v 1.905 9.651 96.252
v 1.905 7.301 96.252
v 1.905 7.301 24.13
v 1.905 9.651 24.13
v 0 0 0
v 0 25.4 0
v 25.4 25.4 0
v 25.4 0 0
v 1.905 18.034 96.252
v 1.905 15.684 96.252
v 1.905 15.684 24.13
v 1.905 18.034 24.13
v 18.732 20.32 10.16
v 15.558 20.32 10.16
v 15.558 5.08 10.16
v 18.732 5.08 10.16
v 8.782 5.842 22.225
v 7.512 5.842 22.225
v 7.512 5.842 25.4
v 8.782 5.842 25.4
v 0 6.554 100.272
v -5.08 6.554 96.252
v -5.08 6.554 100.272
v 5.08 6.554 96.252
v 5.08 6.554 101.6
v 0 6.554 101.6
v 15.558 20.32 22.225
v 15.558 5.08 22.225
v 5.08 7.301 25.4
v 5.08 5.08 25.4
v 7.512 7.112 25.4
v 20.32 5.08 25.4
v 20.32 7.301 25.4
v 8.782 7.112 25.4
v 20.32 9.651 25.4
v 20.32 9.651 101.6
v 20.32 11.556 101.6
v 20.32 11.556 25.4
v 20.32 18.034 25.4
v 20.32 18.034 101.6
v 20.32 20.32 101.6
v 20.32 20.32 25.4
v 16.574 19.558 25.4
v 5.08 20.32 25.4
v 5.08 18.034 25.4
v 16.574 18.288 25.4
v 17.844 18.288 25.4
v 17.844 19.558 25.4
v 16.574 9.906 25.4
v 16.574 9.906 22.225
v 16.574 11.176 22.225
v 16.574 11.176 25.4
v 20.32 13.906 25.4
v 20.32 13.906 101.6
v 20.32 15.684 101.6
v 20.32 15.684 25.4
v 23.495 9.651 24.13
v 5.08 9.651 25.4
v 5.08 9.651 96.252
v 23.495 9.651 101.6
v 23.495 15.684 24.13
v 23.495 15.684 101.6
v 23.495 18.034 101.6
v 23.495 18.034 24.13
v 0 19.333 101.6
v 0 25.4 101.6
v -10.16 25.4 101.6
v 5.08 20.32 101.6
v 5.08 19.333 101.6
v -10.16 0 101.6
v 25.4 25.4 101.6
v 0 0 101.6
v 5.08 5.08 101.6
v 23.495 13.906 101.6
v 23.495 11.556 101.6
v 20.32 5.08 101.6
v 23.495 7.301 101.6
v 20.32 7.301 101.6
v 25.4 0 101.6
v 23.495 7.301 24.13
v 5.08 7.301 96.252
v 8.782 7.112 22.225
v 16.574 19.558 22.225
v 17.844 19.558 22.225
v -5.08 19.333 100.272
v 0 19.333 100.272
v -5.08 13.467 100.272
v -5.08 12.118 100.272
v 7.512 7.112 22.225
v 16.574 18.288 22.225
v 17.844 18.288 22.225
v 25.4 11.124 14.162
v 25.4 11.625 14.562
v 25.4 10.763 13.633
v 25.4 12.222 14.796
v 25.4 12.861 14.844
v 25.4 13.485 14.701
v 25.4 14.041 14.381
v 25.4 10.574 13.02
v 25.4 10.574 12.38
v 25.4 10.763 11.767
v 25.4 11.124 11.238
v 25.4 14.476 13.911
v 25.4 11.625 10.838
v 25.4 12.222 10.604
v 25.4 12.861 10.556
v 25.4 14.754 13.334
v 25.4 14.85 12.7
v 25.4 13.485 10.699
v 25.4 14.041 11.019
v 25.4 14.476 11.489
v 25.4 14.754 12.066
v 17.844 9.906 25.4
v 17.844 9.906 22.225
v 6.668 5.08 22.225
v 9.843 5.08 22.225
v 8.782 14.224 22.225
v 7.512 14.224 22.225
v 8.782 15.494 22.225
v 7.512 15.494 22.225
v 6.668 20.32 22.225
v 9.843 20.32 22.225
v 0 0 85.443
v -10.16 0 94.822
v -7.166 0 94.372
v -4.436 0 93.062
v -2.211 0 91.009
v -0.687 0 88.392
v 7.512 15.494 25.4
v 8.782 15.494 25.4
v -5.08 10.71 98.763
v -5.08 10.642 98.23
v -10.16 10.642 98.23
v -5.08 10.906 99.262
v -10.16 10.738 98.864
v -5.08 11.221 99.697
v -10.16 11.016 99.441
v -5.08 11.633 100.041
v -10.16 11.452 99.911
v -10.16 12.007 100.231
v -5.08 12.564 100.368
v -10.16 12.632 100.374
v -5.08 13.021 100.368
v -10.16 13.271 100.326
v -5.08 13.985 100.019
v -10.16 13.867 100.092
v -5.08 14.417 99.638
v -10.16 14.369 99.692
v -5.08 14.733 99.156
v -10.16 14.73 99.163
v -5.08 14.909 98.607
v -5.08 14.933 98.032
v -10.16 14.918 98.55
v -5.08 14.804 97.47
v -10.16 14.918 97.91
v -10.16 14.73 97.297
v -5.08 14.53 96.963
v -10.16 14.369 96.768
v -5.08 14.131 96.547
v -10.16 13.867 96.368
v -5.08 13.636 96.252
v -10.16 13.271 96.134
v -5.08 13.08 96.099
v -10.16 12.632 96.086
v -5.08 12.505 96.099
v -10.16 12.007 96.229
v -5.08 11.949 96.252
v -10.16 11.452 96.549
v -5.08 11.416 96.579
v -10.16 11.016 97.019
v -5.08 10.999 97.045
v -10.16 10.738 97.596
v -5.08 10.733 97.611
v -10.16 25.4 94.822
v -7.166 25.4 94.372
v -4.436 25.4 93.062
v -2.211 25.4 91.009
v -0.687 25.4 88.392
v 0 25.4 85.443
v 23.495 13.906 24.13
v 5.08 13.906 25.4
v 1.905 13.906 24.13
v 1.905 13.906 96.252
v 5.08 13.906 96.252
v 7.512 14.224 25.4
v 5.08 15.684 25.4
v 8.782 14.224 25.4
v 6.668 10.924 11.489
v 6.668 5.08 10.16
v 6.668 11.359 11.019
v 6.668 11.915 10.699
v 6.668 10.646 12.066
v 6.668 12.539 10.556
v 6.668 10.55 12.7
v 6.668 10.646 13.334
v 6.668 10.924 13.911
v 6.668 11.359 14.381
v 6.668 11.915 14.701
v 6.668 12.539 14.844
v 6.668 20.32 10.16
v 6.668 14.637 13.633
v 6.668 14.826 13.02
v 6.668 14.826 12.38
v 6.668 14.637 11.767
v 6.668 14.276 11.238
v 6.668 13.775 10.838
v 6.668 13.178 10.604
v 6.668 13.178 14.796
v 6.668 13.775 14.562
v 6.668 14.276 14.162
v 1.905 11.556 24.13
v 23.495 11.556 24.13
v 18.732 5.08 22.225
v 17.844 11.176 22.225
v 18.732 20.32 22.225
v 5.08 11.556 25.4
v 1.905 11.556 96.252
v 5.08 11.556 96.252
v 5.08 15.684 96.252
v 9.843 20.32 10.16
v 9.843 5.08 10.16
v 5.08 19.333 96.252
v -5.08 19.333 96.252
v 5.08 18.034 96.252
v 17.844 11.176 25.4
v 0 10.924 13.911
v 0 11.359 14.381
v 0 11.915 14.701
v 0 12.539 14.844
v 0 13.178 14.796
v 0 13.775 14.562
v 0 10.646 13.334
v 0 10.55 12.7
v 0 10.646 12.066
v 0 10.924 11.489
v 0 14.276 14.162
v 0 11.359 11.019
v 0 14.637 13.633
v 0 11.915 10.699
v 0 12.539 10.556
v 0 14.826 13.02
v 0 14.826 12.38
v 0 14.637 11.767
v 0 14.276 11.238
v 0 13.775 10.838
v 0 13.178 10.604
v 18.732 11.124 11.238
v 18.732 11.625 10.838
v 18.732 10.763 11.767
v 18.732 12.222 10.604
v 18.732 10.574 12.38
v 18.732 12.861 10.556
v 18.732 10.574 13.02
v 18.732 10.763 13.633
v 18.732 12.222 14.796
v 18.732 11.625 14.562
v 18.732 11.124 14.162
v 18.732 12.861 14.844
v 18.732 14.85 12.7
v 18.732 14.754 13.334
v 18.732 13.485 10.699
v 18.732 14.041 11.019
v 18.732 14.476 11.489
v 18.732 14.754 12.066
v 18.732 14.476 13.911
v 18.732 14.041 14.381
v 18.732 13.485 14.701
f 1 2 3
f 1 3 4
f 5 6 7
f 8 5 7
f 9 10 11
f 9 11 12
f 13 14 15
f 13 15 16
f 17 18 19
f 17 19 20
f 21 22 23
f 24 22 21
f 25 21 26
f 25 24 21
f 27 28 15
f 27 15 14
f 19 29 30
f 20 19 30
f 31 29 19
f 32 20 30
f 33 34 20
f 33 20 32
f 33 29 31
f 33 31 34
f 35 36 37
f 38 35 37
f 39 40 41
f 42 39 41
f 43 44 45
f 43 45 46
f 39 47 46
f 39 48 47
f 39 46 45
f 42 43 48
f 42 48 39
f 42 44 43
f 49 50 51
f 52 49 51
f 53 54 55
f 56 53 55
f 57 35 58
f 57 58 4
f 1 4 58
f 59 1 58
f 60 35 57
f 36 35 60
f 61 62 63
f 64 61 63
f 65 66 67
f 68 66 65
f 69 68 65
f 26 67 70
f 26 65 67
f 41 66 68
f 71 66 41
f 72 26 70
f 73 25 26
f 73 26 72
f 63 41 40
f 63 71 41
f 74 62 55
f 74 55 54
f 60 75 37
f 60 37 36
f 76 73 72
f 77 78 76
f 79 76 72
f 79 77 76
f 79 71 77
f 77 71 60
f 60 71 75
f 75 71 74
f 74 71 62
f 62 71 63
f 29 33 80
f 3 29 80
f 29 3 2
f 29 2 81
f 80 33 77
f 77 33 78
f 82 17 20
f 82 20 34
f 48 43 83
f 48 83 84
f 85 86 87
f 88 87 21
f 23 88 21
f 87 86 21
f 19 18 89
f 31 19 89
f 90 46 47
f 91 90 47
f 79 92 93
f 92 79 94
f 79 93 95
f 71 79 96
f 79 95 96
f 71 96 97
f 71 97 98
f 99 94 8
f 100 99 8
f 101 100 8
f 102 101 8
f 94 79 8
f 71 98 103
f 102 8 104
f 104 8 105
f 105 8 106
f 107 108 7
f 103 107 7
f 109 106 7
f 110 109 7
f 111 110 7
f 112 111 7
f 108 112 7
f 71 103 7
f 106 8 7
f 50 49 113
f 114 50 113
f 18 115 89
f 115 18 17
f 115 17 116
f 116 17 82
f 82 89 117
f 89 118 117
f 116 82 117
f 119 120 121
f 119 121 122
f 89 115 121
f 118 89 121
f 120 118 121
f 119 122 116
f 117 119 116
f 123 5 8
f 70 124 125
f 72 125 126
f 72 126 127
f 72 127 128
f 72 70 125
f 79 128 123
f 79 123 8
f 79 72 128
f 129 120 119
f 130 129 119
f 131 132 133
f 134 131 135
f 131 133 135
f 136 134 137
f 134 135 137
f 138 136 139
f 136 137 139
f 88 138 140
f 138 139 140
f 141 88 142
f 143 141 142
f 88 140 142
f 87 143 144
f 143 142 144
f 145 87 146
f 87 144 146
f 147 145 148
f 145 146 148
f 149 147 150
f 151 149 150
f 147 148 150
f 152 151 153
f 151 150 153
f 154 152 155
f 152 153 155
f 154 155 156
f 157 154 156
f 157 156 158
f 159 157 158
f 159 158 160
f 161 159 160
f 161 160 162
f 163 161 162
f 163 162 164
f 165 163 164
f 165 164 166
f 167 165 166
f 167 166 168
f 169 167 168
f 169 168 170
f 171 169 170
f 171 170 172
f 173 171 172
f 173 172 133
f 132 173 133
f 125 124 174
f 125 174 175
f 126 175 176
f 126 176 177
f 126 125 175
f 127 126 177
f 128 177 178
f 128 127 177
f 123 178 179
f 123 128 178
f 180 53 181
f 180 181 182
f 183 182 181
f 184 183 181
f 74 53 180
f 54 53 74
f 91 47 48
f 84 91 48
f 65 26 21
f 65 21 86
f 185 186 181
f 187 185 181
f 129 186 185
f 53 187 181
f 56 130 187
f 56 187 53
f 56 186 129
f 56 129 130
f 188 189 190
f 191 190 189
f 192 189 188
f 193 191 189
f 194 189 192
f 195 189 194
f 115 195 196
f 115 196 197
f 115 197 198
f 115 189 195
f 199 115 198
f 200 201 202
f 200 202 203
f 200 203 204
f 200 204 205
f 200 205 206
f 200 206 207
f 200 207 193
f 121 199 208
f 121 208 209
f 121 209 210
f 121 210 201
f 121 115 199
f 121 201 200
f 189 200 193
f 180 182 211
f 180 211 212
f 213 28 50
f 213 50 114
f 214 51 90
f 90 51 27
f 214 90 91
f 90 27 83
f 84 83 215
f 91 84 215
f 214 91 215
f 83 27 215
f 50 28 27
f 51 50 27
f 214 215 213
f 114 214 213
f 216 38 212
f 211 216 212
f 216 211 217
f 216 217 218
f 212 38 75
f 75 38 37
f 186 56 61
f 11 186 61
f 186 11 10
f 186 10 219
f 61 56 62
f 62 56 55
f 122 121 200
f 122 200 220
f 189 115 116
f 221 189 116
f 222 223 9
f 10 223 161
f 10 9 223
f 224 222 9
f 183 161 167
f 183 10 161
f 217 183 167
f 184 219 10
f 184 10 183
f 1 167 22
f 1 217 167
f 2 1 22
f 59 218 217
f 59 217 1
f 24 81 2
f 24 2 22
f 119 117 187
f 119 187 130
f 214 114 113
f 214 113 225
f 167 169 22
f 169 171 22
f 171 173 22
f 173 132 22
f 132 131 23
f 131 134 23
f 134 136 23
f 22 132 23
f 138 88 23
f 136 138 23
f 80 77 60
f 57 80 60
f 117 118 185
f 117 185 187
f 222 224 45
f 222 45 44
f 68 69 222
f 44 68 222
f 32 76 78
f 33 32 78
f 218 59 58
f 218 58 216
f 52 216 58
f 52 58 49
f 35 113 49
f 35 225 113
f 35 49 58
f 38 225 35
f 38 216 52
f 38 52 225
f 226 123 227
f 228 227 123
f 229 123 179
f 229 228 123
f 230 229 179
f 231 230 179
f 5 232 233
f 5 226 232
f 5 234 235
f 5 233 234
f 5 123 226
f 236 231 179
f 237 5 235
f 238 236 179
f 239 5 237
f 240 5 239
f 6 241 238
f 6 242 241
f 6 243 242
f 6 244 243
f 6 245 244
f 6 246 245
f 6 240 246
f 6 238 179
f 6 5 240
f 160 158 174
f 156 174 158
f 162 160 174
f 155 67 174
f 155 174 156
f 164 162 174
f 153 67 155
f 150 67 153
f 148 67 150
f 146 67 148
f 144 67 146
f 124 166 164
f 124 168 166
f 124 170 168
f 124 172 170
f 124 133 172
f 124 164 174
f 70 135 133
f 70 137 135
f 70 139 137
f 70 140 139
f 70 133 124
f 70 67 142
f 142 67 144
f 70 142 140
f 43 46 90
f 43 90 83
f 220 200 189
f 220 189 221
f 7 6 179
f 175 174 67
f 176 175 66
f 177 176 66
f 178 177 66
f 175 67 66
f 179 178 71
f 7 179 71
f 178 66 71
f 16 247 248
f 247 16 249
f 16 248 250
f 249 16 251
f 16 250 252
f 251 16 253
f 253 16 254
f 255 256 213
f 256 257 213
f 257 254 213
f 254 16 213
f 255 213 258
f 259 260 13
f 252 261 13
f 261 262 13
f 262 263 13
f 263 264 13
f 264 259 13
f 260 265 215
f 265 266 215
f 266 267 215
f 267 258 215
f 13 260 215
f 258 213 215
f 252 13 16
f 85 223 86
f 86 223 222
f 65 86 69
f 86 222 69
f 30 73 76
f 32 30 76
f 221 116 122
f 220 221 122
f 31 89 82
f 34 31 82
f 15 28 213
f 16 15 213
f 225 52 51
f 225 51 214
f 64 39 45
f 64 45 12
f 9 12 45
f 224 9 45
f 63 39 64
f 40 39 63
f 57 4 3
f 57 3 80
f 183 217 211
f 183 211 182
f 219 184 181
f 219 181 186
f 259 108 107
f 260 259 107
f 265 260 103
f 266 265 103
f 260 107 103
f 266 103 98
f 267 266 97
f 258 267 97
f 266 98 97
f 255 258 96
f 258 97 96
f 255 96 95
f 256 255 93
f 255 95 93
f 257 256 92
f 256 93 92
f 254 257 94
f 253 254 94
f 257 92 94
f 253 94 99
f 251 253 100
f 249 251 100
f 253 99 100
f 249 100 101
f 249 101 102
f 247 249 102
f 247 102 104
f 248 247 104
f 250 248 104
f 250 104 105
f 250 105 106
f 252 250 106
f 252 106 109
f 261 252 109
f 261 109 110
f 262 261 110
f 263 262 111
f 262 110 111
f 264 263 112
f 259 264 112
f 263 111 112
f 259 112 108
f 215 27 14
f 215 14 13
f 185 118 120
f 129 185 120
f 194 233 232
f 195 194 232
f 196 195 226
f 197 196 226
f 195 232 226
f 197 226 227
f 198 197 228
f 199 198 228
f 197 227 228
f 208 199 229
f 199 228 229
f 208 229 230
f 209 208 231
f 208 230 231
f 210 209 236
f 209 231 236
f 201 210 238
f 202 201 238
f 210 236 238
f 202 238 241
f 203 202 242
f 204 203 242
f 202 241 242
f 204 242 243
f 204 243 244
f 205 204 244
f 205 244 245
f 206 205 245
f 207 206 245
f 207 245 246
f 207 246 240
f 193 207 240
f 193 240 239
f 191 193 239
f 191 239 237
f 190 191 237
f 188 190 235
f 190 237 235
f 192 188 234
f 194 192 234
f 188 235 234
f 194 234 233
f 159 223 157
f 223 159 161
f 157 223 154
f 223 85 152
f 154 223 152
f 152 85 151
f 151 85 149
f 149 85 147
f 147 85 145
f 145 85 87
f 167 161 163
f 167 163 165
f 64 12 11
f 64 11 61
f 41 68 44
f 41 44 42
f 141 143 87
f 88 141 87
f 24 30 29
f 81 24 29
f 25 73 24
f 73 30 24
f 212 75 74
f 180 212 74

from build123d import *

# Parameters (mm, degrees)
F0_W      = 25.4
F0_H      = 25.4
F1_DEPTH  = 101.6
F2_W      = 15.24
F2_H      = 15.24
F3_DEPTH  = 76.2
F6_START  = -3.175
F5_W      = 3.175
F5_H      = 15.24
F6_DEPTH  = 12.065
F4_R      = 2.15
F7_DEPTH  = 6.6675
F8_R      = 2.15
F9_DEPTH  = 6.6675
F10_W     = 1.27
F10_H     = 1.27
F12_DEPTH = 3.175
F11_W     = 1.27
F11_H     = 1.27
F13_DEPTH = 3.175
F14_W     = 12.7794421278
F14_H     = 4.0193349123
F15_DEPTH = 5.08
F16_W     = 25.4
F16_H     = 6.7783382893
F16_W_2   = 12.7794421278
F16_H_2   = 4.0193349123
F17_DEPTH = 5.08
F18_W     = 25.4
F18_H     = 6.7783382893
F19_DEPTH = 5.08
F20_R     = 2.15
F21_DEPTH = 5.08
F23_DEPTH = 25.4
F24_W     = 21.59
F24_H     = 2.35
F25_DEPTH = 77.47
F26_W     = 12.7794421278
F26_H     = 1.3284322977
F27_DEPTH = 5.08


with BuildPart() as f1:
    # F0 (on Top) → F1 (new body)
    with BuildSketch(Plane.XY):
        with Locations((12.7, 12.7)):
            Rectangle(F0_W, F0_H)
    extrude(amount=F1_DEPTH)

    # F2 (on face) → F3 (cut)
    with BuildSketch(Plane.XY.offset(101.6)):
        with Locations((12.7, 12.7)):
            Rectangle(F2_W, F2_H)
    extrude(amount=-F3_DEPTH, mode=Mode.SUBTRACT)

    # F5 (on face) → F6 (cut)
    with BuildSketch(Plane.XY.offset(25.4).offset(F6_START)):
        with Locations((17.145, 12.7)):
            Rectangle(F5_W, F5_H)
        with Locations((8.255, 12.7)):
            Rectangle(F5_W, F5_H)
    extrude(amount=-F6_DEPTH, mode=Mode.SUBTRACT)

    # F4 (on face) → F7 (cut, through all)
    with BuildSketch(Plane.YZ.offset(25.4)):
        with Locations((12.7, 12.7)):
            Circle(F4_R)
    extrude(amount=-F7_DEPTH, mode=Mode.SUBTRACT)

    # F8 (on face) → F9 (cut, through all)
    with BuildSketch(Plane(origin=(0, 0, 0), x_dir=(0, -1, 0), z_dir=(-1, 0, 0))):
        with Locations((-12.7, 12.7)):
            Circle(F8_R)
    extrude(amount=-F9_DEPTH, mode=Mode.SUBTRACT)

    # F10 (on face) → F12 (cut, through all)
    with BuildSketch(Plane.XY.offset(25.4)):
        with Locations((17.2085, 18.923)):
            Rectangle(F10_W, F10_H)
        with Locations((17.2085, 10.541)):
            Rectangle(F10_W, F10_H)
    extrude(amount=-F12_DEPTH, mode=Mode.SUBTRACT)

    # F11 (on face) → F13 (cut, through all)
    with BuildSketch(Plane.XY.offset(25.4)):
        with Locations((8.1467080774, 6.477)):
            Rectangle(F11_W, F11_H)
        with Locations((8.1467080774, 14.859)):
            Rectangle(F11_W, F11_H)
    extrude(amount=-F13_DEPTH, mode=Mode.SUBTRACT)

    # F14 (on face) → F15 (cut, through all)
    with BuildSketch(Plane(origin=(0, 0, 0), x_dir=(0, -1, 0), z_dir=(-1, 0, 0))):
        with Locations((-12.943365844, 98.2619002461)):
            Rectangle(F14_W, F14_H)
    extrude(amount=-F15_DEPTH, mode=Mode.SUBTRACT)

    # F16 (on face) → F17 (join)
    with BuildSketch(Plane(origin=(0, 0, 0), x_dir=(0, -1, 0), z_dir=(-1, 0, 0))):
        with Locations((-12.7, 98.2108308554)):
            Rectangle(F16_W, F16_H)
        with Locations((-12.943365844, 98.2619002461)):
            Rectangle(F16_W_2, F16_H_2, mode=Mode.SUBTRACT)
    extrude(amount=F17_DEPTH)

    # F18 (on face) → F19 (join)
    with BuildSketch(Plane(origin=(-5.08, 0, 0), x_dir=(0, -1, 0), z_dir=(-1, 0, 0))):
        with Locations((-12.7, 98.2108308554)):
            Rectangle(F18_W, F18_H)
    extrude(amount=F19_DEPTH)

    # F20 (on face) → F21 (cut)
    with BuildSketch(Plane(origin=(-10.16, 0, 0), x_dir=(0, -1, 0), z_dir=(-1, 0, 0))):
        with Locations((-12.7924755216, 98.2300043106)):
            Circle(F20_R)
    extrude(amount=-F21_DEPTH, mode=Mode.SUBTRACT)

    # F22 (on face) → F23 (join, through all)
    with BuildSketch(Plane.XZ):
        with BuildLine():
            ThreePointArc((-10.16, 94.8216617107), (-3.2465860676, 92.1186283067), (0, 85.4431986809))
            Line((0, 85.4431986809), (0, 94.8216617107))
            Line((0, 94.8216617107), (-10.16, 94.8216617107))
        make_face()
    extrude(amount=-F23_DEPTH)

    # F24 (on face) → F25 (cut)
    with BuildSketch(Plane.XY.offset(101.6)):
        with Locations((12.7, 16.859)):
            Rectangle(F24_W, F24_H)
        with Locations((12.7, 8.476)):
            Rectangle(F24_W, F24_H)
        with Locations((12.7, 12.731)):
            Rectangle(F24_W, F24_H)
    extrude(amount=-F25_DEPTH, mode=Mode.SUBTRACT)

    # F26 (on face) → F27 (cut)
    with BuildSketch(Plane.YZ.offset(5.08)):
        with Locations((12.943365844, 100.9357838511)):
            Rectangle(F26_W, F26_H)
    extrude(amount=-F27_DEPTH, mode=Mode.SUBTRACT)


solid = f1.part
